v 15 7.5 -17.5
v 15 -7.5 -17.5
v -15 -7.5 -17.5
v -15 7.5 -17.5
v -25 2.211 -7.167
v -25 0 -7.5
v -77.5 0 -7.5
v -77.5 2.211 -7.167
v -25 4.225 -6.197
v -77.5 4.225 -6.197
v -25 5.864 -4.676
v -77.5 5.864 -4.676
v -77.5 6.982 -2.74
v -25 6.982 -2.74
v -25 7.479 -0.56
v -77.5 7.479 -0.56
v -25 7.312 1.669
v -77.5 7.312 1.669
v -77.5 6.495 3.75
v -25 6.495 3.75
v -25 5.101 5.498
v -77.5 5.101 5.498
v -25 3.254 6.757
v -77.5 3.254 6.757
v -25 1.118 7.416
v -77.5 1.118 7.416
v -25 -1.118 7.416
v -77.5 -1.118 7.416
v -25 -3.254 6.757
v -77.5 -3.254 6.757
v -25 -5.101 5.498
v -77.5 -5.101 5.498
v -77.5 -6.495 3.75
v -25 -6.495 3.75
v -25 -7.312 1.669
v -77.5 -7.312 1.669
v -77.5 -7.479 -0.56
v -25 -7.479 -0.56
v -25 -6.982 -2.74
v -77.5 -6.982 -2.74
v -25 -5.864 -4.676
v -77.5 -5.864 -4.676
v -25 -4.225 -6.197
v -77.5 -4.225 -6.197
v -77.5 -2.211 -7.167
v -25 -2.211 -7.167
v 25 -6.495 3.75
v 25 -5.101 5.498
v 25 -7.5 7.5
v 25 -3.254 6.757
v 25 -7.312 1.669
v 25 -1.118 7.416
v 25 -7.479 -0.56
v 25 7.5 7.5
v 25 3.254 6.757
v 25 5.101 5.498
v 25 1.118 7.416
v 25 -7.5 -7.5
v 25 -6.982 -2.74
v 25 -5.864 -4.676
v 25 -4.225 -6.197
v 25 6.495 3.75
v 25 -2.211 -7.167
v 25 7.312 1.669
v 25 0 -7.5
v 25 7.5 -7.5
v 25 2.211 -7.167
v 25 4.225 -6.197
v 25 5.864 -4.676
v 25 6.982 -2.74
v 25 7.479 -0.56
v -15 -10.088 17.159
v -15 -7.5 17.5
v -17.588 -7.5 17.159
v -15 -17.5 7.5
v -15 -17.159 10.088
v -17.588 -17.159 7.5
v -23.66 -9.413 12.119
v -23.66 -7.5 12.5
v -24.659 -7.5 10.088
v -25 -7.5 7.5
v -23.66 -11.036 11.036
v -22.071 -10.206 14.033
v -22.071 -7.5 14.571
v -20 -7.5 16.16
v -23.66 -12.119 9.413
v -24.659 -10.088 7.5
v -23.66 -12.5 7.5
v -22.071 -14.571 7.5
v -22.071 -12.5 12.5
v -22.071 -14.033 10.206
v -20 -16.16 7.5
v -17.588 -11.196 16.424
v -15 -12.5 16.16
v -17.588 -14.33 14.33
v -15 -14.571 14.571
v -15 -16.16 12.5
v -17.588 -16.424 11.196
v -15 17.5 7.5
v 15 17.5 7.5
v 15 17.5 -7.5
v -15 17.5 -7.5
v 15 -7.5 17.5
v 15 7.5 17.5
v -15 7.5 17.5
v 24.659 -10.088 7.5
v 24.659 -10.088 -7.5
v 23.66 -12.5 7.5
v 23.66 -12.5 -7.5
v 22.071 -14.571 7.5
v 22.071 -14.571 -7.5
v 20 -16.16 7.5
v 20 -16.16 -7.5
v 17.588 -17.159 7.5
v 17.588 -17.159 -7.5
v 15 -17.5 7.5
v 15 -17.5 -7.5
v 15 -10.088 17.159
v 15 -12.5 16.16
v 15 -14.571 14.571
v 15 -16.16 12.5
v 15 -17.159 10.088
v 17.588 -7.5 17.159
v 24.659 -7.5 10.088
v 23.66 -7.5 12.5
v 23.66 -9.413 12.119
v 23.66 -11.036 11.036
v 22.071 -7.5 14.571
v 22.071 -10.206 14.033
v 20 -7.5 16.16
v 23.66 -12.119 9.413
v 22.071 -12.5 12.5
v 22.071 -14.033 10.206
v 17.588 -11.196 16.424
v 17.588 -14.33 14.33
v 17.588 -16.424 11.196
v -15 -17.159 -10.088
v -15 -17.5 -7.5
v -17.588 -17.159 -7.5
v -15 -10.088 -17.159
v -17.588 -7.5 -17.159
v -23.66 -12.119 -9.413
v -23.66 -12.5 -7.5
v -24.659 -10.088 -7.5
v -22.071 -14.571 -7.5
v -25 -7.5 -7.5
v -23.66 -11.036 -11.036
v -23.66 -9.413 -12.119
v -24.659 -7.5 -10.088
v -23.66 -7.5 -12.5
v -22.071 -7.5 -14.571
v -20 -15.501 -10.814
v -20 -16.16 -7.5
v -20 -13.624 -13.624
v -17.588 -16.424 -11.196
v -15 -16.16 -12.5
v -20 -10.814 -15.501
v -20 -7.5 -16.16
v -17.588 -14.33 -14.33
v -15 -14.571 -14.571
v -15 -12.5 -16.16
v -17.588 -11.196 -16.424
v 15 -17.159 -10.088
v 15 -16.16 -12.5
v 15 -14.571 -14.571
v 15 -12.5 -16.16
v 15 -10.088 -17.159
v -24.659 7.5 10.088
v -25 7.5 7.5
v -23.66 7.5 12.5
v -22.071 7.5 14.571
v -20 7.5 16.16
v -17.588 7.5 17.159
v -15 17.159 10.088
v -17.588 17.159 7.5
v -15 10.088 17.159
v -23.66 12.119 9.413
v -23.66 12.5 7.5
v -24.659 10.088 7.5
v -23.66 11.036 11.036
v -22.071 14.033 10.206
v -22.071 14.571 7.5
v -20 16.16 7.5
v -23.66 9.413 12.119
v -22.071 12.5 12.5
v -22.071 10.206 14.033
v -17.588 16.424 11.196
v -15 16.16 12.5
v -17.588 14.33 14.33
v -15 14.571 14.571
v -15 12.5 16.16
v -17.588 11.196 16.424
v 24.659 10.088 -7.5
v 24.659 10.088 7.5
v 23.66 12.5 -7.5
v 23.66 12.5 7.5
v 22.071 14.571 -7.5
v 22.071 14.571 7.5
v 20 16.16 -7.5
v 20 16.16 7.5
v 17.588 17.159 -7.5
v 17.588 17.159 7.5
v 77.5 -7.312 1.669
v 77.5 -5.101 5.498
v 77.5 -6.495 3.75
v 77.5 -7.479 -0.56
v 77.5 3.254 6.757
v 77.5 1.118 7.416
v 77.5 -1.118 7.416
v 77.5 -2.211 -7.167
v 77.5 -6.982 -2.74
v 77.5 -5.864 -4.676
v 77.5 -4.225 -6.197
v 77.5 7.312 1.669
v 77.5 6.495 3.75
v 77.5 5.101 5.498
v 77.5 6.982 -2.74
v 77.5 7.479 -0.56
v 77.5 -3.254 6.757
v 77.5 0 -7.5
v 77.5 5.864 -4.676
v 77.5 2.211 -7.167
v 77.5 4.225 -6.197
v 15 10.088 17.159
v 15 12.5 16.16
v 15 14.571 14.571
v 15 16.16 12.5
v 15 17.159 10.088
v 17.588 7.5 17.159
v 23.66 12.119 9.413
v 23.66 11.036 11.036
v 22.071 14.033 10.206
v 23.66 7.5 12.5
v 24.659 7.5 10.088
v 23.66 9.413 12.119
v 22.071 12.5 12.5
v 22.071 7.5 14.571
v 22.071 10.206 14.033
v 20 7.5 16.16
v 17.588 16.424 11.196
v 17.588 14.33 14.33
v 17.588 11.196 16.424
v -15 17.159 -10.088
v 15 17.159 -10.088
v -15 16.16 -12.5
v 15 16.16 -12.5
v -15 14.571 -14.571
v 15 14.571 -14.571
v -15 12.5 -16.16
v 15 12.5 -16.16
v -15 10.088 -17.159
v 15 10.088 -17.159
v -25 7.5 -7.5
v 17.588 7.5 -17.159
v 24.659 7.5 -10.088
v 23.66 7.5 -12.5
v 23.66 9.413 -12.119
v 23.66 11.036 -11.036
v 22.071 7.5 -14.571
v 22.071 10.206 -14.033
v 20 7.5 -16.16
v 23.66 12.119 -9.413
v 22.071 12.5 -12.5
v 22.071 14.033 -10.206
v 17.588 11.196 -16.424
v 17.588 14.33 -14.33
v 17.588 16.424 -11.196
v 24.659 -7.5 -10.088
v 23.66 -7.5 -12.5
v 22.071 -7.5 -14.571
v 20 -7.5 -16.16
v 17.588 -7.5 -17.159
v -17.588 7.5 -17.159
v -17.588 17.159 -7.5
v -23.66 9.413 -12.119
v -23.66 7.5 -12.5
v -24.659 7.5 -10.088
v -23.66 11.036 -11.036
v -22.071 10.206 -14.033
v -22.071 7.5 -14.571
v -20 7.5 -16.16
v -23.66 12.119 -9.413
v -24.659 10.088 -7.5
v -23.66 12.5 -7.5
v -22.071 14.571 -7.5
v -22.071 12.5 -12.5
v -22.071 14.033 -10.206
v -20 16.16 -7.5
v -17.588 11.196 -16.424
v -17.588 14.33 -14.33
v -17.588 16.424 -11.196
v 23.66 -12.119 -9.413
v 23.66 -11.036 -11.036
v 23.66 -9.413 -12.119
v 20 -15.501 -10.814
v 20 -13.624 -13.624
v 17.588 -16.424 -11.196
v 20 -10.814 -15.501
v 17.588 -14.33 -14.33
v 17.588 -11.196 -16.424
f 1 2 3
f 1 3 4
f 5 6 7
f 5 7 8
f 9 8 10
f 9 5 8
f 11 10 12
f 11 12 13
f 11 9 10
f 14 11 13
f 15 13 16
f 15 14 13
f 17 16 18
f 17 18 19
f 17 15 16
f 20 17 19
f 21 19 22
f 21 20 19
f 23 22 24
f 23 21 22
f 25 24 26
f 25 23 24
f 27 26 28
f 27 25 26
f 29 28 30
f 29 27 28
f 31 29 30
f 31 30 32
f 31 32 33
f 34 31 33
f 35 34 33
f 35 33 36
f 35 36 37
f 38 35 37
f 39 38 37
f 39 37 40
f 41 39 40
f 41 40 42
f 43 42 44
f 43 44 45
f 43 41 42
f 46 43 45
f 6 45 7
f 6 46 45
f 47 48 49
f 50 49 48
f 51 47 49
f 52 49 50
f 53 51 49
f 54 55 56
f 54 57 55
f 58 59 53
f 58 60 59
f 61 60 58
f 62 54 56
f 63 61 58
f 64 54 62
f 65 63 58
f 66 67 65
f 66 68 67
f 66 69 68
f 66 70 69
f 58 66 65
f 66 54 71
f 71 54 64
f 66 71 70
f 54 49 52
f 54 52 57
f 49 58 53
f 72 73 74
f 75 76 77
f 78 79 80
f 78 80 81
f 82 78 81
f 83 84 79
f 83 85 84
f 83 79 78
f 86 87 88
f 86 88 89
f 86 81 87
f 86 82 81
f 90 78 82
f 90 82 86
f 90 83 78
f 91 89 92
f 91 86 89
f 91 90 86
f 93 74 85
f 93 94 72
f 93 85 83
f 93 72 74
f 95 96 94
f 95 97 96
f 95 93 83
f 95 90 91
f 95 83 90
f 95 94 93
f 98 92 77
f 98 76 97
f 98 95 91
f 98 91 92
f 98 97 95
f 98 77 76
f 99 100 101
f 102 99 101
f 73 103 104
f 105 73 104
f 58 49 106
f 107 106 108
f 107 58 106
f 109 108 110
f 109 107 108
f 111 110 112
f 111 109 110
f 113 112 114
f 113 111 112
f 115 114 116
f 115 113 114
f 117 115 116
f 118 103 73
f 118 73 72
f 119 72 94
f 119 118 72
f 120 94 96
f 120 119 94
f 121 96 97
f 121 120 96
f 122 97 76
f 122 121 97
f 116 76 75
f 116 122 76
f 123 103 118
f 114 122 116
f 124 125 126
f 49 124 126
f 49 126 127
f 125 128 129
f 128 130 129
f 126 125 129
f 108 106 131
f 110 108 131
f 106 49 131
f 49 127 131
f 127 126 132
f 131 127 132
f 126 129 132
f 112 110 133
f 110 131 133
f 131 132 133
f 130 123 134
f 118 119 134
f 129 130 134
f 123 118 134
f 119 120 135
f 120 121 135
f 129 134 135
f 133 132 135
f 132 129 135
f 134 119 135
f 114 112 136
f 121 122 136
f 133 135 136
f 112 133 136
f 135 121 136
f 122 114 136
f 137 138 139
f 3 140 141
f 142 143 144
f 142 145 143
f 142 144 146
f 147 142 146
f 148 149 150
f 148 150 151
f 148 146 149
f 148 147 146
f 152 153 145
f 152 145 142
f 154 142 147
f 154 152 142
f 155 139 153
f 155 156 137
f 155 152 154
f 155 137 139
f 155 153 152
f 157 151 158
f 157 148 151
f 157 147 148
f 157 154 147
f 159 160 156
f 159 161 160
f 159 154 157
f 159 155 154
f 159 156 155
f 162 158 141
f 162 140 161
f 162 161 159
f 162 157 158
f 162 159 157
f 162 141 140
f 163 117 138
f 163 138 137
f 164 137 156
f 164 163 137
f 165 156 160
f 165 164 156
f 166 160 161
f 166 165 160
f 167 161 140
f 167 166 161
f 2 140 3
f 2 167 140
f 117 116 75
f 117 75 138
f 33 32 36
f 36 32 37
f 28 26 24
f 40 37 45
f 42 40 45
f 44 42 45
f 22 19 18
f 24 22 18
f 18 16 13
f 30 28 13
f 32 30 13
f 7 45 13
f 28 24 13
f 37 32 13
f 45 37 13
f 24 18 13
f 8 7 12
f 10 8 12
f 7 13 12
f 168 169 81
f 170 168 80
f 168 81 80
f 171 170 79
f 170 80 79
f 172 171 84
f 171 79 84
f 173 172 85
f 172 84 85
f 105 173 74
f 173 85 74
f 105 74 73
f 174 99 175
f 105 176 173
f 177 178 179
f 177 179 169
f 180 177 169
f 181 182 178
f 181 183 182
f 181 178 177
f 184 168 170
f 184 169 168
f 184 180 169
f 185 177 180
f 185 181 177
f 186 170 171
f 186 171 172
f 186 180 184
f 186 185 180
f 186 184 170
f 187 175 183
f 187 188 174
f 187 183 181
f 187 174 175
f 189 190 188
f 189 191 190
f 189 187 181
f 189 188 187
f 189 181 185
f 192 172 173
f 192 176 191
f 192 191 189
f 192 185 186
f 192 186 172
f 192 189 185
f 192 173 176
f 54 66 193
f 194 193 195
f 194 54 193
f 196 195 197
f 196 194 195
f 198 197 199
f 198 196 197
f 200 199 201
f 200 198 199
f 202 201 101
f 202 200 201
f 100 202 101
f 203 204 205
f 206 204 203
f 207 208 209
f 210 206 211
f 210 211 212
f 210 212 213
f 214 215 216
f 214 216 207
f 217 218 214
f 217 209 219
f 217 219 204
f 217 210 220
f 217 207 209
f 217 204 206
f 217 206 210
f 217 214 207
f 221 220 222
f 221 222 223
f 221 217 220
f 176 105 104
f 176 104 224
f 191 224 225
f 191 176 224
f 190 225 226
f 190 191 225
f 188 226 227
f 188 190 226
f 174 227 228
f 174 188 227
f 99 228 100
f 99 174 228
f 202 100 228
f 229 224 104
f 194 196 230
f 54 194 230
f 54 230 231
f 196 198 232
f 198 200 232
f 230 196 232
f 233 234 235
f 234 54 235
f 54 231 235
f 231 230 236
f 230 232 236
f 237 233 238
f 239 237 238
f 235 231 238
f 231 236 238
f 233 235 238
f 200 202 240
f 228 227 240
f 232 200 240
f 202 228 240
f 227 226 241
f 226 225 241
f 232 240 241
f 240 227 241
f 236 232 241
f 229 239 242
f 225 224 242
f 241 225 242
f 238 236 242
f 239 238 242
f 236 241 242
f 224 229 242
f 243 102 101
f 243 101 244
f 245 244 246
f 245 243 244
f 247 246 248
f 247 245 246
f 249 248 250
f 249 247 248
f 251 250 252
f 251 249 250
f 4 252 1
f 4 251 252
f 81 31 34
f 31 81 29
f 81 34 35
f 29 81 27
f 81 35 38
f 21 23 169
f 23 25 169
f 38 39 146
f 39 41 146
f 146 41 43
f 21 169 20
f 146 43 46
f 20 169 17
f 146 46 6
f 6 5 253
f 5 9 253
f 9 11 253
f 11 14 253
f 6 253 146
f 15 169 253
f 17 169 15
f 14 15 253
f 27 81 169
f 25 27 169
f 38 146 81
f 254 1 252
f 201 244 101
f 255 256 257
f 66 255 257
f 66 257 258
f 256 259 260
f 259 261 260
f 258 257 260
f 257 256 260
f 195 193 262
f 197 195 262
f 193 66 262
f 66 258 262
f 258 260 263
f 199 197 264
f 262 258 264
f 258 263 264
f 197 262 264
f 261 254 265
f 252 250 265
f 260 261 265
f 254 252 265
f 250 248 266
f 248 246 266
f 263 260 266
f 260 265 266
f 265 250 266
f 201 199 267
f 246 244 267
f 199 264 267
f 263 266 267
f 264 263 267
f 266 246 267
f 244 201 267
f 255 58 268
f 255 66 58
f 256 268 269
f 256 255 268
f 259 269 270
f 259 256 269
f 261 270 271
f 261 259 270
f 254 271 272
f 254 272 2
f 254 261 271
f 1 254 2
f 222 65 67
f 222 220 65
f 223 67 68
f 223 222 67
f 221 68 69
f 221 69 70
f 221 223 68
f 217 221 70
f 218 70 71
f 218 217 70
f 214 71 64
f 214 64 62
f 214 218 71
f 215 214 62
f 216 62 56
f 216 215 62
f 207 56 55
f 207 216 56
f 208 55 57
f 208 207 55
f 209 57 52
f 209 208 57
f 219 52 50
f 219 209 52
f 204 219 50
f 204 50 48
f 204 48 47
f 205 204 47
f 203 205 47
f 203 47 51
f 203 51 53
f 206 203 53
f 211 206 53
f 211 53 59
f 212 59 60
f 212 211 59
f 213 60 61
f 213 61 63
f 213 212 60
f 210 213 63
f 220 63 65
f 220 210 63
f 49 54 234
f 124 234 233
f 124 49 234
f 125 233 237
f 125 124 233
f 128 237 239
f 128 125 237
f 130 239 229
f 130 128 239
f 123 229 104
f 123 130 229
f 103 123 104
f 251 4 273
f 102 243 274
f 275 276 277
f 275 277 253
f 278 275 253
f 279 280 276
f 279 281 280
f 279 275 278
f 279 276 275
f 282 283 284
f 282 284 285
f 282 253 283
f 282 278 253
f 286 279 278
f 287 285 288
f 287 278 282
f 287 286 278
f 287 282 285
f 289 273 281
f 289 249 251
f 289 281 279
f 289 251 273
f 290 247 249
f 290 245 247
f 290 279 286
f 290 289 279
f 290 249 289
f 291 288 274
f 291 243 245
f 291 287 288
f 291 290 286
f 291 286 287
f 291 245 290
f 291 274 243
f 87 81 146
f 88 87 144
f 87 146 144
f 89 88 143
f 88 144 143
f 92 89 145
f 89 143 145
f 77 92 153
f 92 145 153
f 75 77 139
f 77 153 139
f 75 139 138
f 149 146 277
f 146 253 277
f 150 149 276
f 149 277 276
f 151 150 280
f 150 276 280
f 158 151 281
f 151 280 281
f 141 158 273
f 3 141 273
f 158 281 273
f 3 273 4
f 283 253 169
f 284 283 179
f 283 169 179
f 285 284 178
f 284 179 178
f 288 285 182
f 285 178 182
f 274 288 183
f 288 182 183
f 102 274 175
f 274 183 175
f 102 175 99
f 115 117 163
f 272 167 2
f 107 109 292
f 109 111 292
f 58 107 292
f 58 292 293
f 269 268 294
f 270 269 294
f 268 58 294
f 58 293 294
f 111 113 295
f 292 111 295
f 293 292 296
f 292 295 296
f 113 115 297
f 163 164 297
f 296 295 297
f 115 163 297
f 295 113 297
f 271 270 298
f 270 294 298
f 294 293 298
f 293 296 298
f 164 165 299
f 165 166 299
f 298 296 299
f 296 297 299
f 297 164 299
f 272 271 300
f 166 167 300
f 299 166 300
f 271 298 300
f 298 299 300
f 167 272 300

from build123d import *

# Parameters (mm, degrees)
SKETCH_2_R      = 7.5
EXTRUDE_1_DEPTH = 77.5
SKETCH_3_W      = 35
SKETCH_3_H      = 35
EXTRUDE_2_DEPTH = 25
FILLET_1_R      = 10
FILLET_2_R      = 10


with BuildPart() as part:
    # 草图2 → 凸台-拉伸1 (new, symmetric)
    with BuildSketch(Plane(origin=(0, 0, 0), x_dir=(0, 0, -1), z_dir=(1, 0, 0))):
        Circle(SKETCH_2_R)
    extrude(amount=EXTRUDE_1_DEPTH, both=True)

    # 草图3 → 凸台-拉伸2 (add, symmetric)
    with BuildSketch(Plane(origin=(0, 0, 0), x_dir=(0, 0, -1), z_dir=(1, 0, 0))):
        Rectangle(SKETCH_3_W, SKETCH_3_H)
    extrude(amount=EXTRUDE_2_DEPTH, both=True)

    # 圆角1
    fillet_1_edges = [part.edges().sort_by_distance(p)[0] for p in [
        (0, 17.5, 17.5),
        (0, -17.5, 17.5),
        (0, -17.5, -17.5),
        (0, 17.5, -17.5),
    ]]
    fillet(fillet_1_edges, radius=FILLET_1_R)

    # 圆角2
    fillet_2_edges = [part.edges().sort_by_distance(p)[0] for p in [
        (-25, 0, -17.5),
        (25, 0, -17.5),
        (-25, 0, 17.5),
        (-25, 17.5, 0),
        (-25, -17.5, 0),
        (-25, 14.571067812, 14.571067812),
        (-25, -14.571067812, 14.571067812),
        (-25, 14.571067812, -14.571067812),
        (-25, -14.571067812, -14.571067812),
        (25, -17.5, 0),
        (25, 0, 17.5),
        (25, 17.5, 0),
        (25, 14.571067812, 14.571067812),
        (25, -14.571067812, 14.571067812),
        (25, 14.571067812, -14.571067812),
        (25, -14.571067812, -14.571067812),
    ]]
    fillet(fillet_2_edges, radius=FILLET_2_R - 0.0001)  # a hair under: the kernel refuses the full size


solid = part.part
